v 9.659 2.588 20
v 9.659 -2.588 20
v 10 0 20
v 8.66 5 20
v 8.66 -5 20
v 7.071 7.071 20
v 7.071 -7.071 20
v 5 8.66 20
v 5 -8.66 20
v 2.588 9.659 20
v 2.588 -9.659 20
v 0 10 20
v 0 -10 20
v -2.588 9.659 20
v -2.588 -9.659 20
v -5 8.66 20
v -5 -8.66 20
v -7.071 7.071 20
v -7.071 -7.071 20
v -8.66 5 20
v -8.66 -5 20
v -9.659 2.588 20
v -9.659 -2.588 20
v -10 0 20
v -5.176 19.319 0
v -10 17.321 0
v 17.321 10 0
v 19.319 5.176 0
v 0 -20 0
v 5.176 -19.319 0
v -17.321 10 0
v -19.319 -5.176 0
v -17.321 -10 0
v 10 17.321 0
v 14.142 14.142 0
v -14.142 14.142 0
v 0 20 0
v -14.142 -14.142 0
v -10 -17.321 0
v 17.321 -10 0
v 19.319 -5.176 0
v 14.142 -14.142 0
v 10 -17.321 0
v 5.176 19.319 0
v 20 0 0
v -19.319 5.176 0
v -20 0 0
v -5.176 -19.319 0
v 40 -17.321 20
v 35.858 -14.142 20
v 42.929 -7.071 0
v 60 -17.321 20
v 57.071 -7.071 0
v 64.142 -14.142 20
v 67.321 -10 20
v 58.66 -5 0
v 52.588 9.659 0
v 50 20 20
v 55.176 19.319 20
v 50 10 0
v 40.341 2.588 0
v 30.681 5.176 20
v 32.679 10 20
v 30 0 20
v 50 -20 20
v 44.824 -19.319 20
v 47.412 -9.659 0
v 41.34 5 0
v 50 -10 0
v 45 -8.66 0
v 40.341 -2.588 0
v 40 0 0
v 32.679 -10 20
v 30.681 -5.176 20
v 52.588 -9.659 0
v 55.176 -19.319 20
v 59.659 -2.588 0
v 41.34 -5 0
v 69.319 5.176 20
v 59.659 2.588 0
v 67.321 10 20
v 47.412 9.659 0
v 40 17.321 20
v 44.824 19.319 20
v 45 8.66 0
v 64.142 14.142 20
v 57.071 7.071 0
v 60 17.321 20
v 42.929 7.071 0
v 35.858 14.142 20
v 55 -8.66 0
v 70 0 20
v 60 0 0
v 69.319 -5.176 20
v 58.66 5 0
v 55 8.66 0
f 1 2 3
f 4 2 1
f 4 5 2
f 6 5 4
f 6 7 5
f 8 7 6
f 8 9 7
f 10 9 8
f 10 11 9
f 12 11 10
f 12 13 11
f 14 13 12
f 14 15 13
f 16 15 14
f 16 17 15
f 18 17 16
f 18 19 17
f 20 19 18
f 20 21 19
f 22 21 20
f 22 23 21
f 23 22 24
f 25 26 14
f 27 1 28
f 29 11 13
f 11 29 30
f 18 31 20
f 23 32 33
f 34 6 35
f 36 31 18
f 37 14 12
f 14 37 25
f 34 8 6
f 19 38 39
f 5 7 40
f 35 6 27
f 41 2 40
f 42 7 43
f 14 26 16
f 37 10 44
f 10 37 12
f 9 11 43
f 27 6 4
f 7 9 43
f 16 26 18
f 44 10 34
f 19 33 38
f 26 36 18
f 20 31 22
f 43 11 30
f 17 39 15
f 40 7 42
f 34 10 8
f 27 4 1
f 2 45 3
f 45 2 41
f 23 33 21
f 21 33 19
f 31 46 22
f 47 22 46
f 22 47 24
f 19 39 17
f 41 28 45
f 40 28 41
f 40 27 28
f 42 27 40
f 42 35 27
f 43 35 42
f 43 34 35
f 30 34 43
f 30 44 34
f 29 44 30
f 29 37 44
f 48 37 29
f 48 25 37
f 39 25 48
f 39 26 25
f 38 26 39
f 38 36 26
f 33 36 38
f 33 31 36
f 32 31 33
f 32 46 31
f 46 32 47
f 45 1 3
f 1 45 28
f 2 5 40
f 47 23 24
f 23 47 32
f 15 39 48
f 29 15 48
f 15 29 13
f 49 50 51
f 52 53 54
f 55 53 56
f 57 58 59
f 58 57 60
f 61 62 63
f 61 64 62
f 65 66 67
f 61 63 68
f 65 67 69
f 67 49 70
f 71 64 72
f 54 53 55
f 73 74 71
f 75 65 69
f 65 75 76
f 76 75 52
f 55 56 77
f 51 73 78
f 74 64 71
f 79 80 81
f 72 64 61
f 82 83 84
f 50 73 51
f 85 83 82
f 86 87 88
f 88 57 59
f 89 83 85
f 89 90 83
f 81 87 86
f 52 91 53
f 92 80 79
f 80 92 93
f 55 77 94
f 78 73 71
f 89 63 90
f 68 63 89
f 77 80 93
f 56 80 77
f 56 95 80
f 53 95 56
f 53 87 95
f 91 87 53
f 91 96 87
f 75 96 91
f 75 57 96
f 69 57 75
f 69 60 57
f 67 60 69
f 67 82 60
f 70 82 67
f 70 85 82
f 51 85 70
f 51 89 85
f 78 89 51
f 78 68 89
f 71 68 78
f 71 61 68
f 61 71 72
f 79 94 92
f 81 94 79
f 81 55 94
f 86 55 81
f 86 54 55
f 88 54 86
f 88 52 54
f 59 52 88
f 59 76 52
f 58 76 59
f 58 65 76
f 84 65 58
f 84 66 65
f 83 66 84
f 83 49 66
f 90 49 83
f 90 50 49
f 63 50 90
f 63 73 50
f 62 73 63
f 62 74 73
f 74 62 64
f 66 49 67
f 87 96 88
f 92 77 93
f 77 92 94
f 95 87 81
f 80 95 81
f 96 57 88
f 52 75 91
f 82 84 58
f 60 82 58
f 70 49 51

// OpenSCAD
// file: ../cone.scad
module cone(height, bottomRadius, topRadius)
{
    cylinder(h=height, r1=bottomRadius, r2=topRadius, $fn=24);
}
// main file
use <../cone.scad>

cone(height = 20, bottomRadius = 20, topRadius = 10);

translate([50, 0, 0])
cone(height = 20, bottomRadius = 10, topRadius = 20);
